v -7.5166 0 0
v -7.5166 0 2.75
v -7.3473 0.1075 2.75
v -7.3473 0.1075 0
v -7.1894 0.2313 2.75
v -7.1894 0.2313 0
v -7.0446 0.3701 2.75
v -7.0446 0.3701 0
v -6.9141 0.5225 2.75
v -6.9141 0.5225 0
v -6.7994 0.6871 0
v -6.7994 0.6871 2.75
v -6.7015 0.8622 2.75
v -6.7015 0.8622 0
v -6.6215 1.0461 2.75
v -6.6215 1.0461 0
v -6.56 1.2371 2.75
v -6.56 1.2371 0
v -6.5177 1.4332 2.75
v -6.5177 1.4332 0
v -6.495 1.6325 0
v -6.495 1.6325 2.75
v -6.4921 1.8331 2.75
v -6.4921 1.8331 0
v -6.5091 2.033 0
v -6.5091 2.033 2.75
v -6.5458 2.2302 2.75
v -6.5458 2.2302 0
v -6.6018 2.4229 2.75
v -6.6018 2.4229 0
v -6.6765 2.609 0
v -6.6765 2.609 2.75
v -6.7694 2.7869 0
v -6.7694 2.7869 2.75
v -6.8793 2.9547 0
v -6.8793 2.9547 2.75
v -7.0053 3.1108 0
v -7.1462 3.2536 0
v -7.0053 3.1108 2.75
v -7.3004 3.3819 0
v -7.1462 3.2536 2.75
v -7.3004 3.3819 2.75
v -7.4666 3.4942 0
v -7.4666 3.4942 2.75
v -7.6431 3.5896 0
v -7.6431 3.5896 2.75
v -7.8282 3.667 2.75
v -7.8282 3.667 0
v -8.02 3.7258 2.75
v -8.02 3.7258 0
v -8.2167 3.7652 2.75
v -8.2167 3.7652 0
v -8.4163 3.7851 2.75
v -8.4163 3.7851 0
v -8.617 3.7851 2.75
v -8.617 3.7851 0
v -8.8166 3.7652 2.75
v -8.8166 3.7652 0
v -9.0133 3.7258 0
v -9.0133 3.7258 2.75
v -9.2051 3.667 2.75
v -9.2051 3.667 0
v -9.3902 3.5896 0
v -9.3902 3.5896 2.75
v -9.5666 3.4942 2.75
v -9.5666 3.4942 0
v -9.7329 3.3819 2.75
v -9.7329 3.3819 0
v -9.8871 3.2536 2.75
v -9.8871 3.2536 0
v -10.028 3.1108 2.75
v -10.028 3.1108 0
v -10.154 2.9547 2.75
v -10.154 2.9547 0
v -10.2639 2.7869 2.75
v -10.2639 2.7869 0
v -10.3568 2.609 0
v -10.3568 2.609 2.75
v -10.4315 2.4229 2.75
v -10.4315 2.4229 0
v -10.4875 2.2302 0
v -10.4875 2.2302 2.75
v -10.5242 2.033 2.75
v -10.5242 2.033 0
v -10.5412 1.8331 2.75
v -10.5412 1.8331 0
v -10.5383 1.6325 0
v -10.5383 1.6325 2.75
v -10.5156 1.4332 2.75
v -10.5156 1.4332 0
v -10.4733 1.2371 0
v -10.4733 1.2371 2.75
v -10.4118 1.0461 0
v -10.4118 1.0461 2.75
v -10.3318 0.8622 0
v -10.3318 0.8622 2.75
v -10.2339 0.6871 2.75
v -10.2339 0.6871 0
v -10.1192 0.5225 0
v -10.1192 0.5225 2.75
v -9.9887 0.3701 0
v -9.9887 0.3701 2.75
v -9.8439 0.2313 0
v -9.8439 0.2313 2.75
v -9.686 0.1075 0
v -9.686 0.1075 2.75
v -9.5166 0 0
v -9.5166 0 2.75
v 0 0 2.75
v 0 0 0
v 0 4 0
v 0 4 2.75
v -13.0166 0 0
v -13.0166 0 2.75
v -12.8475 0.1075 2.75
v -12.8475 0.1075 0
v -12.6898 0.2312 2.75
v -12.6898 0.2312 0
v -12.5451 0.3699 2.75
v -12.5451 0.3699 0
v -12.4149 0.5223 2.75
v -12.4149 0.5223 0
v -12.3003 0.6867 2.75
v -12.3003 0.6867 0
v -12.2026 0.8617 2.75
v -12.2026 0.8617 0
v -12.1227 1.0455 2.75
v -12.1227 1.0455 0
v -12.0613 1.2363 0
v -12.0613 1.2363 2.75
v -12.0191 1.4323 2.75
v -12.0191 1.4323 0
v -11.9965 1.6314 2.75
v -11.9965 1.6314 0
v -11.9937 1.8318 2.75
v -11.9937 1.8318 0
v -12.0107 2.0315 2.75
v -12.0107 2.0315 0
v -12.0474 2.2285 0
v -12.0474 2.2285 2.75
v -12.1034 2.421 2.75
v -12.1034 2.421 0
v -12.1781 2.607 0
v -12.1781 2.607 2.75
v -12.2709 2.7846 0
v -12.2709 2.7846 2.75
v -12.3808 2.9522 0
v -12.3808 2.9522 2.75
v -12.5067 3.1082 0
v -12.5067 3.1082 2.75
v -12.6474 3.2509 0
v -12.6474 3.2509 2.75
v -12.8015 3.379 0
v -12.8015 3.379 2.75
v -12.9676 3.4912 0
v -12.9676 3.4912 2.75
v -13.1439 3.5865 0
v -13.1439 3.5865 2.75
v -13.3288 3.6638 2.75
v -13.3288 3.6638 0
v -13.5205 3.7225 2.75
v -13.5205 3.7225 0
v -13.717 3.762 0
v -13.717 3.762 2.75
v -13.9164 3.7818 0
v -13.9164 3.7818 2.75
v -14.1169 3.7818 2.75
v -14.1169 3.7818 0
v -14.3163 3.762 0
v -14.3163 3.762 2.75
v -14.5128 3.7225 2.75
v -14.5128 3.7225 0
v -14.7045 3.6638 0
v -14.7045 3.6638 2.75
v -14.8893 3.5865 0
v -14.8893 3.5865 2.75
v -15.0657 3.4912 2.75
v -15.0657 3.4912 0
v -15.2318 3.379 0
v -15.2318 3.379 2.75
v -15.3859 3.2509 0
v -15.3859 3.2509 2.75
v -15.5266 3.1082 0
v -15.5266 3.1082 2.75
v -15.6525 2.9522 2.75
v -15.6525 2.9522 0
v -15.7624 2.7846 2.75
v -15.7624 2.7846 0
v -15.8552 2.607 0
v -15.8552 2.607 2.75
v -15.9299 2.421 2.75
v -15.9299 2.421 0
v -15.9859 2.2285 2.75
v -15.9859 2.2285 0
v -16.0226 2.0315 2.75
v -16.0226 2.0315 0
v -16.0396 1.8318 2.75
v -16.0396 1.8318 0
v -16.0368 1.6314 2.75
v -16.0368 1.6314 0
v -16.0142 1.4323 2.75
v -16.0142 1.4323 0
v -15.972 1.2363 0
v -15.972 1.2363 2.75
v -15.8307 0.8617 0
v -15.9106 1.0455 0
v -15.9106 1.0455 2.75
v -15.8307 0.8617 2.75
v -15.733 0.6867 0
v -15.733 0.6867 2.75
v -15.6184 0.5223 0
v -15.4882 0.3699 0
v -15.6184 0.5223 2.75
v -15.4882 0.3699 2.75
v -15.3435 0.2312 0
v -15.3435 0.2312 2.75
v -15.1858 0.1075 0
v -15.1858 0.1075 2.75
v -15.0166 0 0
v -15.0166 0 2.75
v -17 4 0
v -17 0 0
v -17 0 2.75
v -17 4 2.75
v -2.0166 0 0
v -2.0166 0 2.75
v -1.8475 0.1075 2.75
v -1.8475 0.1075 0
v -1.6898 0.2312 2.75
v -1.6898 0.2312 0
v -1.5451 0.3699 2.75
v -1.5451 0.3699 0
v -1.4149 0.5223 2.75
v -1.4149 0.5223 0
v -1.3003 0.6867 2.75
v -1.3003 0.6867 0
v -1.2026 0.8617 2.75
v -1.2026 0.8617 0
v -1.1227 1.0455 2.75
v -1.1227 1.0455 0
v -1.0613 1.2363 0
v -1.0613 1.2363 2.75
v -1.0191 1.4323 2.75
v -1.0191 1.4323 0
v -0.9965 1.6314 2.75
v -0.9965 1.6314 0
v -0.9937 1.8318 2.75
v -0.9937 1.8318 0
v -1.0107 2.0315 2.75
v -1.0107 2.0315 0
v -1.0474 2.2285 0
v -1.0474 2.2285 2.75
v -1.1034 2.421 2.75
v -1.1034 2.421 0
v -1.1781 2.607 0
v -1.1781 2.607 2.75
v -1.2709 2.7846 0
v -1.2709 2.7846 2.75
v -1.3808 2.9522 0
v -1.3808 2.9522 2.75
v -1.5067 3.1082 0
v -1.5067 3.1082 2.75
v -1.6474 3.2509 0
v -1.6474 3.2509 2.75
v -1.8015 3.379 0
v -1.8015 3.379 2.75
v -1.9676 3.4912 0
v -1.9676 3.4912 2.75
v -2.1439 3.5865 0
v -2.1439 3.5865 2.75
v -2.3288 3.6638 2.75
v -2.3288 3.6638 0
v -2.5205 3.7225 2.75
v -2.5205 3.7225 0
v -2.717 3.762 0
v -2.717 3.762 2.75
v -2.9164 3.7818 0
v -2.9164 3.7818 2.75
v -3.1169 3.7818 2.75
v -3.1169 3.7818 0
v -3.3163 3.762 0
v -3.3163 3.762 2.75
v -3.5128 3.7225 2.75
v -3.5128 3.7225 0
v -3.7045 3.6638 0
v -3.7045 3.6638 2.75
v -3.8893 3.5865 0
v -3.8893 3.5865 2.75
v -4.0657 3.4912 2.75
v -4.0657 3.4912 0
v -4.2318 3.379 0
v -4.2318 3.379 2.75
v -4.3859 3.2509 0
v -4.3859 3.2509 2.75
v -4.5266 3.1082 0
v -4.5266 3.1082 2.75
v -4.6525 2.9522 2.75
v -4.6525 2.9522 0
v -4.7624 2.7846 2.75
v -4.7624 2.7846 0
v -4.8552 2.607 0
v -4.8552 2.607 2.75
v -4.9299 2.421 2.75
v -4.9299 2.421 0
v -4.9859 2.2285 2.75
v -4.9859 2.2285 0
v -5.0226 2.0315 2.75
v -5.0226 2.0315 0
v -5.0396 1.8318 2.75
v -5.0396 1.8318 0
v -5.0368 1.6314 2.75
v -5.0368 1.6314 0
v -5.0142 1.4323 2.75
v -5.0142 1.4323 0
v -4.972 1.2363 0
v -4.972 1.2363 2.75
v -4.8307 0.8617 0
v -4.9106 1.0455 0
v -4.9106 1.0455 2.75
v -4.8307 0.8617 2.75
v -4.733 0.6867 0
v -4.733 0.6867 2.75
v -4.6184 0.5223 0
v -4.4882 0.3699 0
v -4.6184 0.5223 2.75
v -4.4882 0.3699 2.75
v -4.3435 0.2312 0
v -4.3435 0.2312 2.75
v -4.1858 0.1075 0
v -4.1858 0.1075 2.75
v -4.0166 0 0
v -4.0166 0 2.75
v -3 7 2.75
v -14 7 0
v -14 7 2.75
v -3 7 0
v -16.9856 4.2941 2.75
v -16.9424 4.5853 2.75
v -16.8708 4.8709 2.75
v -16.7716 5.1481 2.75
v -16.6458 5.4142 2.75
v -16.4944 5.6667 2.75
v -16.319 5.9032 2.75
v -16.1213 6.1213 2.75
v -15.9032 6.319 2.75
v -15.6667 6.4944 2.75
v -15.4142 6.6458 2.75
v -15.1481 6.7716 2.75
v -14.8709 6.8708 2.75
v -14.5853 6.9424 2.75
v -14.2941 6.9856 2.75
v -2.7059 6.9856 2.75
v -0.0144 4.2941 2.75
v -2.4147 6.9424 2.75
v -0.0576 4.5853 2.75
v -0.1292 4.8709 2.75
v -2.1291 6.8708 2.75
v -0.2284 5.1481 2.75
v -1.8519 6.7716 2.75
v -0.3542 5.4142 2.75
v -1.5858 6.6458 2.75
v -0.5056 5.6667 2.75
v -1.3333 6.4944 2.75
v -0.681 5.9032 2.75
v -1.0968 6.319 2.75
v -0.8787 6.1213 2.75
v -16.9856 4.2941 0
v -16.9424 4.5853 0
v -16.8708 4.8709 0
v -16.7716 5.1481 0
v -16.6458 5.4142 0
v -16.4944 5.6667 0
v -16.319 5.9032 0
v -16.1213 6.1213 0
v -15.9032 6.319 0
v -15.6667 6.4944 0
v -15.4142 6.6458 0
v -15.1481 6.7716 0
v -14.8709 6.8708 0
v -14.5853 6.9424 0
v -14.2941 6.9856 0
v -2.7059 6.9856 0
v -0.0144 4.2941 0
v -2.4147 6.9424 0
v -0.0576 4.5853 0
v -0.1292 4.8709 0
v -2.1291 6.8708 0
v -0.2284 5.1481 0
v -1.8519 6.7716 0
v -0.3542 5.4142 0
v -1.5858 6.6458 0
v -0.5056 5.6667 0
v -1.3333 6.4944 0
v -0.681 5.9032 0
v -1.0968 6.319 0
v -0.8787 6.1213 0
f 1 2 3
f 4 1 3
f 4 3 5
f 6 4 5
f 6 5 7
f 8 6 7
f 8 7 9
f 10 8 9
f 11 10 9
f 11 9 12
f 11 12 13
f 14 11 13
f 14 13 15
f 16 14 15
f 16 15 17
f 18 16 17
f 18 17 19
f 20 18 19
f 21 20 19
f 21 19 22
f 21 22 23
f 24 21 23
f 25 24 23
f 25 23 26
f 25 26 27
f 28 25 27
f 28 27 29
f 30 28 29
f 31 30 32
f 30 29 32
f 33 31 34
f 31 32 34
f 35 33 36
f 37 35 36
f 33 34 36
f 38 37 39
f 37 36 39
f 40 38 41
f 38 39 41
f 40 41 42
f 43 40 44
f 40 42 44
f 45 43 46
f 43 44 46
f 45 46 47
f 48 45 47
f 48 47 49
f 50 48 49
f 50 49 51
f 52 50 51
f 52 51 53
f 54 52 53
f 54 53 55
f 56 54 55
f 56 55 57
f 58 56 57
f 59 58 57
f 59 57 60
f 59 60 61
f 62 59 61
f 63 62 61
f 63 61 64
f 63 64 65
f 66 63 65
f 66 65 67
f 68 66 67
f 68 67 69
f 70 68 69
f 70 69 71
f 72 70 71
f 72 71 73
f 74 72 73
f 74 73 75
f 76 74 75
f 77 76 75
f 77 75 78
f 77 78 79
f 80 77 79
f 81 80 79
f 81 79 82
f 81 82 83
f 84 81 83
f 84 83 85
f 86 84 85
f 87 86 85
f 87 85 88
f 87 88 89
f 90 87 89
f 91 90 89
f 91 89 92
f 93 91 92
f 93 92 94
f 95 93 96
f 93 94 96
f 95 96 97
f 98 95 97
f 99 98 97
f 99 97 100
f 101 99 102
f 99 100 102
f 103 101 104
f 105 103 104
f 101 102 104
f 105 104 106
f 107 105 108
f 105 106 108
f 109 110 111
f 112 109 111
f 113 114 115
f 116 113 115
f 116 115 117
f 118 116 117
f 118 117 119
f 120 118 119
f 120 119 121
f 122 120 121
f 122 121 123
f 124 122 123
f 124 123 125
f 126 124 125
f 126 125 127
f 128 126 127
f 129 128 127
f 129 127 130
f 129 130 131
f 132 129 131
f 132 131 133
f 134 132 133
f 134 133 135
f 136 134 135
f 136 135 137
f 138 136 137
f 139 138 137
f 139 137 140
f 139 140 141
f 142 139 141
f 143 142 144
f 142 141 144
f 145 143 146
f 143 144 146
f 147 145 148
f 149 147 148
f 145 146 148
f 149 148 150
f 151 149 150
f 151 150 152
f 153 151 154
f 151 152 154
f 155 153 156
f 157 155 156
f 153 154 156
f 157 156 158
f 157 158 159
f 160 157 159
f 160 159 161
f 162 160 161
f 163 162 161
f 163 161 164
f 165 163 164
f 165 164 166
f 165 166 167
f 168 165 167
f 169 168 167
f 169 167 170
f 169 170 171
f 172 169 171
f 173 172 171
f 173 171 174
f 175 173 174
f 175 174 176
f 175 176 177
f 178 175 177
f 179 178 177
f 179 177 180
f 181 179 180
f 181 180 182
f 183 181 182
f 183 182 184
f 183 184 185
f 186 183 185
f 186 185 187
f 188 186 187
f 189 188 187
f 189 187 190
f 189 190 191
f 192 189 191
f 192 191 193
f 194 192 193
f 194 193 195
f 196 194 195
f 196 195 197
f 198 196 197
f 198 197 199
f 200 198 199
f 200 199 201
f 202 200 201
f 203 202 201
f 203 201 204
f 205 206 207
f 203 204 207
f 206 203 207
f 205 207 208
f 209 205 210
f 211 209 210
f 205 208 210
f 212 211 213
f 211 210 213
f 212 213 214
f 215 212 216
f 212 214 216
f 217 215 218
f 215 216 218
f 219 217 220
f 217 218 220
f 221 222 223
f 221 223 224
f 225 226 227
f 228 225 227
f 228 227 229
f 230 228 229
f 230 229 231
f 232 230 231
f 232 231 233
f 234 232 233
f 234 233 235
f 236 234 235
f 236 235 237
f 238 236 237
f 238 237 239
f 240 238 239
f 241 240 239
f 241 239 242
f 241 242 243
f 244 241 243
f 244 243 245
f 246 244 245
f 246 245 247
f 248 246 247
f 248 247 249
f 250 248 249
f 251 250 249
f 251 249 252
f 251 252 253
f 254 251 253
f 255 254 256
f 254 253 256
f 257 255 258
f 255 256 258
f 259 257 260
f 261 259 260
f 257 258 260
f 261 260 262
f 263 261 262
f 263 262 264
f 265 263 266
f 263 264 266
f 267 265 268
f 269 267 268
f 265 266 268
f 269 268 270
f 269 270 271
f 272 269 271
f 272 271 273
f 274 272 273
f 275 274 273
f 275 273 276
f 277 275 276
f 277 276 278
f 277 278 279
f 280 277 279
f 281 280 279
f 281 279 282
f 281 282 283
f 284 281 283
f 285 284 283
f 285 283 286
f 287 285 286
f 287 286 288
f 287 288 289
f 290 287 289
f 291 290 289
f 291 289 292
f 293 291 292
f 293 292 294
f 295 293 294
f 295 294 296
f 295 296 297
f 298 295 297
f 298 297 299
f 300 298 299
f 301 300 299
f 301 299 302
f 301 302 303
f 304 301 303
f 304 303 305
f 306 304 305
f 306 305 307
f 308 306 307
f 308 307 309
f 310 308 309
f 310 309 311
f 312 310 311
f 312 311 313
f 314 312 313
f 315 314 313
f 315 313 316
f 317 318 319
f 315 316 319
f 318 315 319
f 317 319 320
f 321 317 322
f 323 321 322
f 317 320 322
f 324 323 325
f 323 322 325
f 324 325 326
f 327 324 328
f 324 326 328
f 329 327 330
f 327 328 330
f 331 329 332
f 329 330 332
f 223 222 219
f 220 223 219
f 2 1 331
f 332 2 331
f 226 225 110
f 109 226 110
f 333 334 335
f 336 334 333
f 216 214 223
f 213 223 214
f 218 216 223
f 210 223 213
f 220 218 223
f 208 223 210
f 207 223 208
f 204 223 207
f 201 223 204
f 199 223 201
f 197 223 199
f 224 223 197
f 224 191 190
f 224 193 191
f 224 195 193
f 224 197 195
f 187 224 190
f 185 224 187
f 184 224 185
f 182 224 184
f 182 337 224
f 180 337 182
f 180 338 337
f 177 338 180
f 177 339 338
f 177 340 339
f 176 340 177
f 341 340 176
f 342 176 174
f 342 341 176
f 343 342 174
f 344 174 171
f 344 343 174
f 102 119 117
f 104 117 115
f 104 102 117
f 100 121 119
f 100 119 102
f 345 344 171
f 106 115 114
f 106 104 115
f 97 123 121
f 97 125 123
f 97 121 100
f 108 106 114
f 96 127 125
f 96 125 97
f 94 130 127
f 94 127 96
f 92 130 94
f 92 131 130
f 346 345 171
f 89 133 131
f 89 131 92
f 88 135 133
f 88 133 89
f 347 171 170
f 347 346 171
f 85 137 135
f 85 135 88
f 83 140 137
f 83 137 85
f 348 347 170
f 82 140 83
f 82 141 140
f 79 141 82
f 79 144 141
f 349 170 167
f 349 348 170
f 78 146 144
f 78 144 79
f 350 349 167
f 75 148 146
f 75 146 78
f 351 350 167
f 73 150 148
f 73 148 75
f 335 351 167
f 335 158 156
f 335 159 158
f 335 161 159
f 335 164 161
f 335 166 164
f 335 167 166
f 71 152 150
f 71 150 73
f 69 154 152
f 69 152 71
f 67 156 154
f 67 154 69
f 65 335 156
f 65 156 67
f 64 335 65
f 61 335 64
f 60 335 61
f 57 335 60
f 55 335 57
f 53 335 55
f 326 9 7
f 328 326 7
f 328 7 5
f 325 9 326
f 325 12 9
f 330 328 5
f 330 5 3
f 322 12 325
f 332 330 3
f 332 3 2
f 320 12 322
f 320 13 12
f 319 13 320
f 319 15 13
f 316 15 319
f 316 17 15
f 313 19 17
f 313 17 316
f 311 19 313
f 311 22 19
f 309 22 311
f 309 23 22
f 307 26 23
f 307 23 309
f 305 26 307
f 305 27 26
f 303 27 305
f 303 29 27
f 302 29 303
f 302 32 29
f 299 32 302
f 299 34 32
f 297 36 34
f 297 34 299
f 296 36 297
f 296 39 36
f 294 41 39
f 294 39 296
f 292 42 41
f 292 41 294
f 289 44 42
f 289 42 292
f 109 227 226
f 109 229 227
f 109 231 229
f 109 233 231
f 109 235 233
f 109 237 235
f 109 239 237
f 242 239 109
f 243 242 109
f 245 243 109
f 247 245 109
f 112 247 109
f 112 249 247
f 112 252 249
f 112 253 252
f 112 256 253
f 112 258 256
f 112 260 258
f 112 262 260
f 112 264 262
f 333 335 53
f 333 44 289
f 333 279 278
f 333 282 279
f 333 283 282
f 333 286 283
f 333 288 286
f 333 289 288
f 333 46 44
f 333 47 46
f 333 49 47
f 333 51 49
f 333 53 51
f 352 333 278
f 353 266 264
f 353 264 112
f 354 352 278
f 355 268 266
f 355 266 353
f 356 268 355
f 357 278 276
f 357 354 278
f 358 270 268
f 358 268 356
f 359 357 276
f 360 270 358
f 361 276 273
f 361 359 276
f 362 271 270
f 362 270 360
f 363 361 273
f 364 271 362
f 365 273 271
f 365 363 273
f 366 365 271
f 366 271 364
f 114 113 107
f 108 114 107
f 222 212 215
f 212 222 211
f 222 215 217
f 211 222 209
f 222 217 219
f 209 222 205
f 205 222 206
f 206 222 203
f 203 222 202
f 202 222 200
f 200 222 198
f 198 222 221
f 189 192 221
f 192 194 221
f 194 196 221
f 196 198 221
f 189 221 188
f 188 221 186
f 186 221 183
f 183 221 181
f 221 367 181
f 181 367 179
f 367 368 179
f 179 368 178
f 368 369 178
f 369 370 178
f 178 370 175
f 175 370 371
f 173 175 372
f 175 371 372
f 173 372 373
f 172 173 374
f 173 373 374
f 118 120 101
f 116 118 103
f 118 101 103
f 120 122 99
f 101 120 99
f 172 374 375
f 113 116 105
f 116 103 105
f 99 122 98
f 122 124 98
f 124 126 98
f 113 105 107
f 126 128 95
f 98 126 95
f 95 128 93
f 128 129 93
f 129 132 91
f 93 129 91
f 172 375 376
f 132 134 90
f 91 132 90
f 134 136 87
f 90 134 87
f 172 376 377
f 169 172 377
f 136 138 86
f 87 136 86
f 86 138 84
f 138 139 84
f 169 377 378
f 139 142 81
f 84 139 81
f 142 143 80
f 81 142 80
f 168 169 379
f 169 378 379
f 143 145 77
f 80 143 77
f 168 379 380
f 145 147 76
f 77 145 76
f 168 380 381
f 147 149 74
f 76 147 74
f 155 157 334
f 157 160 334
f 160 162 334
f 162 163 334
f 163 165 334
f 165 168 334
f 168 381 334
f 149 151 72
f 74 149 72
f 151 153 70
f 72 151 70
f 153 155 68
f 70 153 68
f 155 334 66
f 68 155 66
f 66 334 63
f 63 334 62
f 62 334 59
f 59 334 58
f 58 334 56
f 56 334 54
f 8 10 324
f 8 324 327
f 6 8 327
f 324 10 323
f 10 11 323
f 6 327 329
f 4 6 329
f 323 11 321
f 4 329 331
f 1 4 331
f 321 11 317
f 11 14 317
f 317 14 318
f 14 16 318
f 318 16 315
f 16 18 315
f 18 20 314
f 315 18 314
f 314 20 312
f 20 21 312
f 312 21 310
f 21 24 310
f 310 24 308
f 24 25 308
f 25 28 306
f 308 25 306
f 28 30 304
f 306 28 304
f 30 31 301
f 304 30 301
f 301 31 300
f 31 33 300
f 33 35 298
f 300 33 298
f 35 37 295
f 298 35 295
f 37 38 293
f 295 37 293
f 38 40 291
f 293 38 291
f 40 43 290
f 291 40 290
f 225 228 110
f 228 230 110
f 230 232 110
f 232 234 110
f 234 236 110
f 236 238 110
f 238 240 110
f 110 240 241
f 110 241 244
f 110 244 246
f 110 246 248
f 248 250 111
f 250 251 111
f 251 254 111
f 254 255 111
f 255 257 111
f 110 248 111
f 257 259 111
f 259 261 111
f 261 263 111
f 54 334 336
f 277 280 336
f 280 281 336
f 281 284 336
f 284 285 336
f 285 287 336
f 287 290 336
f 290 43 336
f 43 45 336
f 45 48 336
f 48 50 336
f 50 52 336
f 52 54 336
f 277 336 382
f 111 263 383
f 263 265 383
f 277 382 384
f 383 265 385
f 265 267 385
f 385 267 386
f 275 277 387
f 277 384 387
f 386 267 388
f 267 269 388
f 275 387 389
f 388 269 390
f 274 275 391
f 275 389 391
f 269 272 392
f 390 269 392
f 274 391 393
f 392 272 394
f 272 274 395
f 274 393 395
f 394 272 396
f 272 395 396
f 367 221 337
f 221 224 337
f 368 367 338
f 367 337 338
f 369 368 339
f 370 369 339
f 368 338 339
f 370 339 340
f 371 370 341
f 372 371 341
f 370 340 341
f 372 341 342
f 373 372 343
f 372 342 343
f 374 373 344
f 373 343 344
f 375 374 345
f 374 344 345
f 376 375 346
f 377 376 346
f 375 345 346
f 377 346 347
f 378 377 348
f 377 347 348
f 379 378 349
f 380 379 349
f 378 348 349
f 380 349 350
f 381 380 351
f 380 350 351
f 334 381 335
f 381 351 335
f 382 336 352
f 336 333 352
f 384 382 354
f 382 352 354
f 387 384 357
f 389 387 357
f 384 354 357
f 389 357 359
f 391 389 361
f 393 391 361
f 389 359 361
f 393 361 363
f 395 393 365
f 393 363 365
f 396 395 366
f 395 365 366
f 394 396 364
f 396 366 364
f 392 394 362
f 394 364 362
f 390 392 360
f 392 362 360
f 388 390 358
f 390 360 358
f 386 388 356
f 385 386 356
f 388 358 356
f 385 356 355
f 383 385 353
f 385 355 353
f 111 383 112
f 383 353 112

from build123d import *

# Parameters (mm, degrees)
F0_W     = 17
F0_H     = 7
F1_DEPTH = 2.75
F3_DEPTH = 25
F4_R     = 3


with BuildPart() as f1:
    # F0 (on Top) → F1 (new body)
    with BuildSketch(Plane.XY):
        with Locations((-8.5, 3.5)):
            Rectangle(F0_W, F0_H)
    extrude(amount=F1_DEPTH)

    # F2 (on face) → F3 (cut)
    with BuildSketch(Plane.XY.offset(2.75)):
        with BuildLine():
            ThreePointArc((-7.516647, 0), (-8.516647, 3.787575), (-9.516647, 0))
            Line((-9.516647, 0), (-7.516647, 0))
        make_face()
        with BuildLine():
            ThreePointArc((-2.016647, 0), (-3.016647, 3.784253), (-4.016647, 0))
            Line((-4.016647, 0), (-2.016647, 0))
        make_face()
        with BuildLine():
            Line((-15.016647, 0), (-13.016647, 0))
            ThreePointArc((-13.016647, 0), (-14.016647, 3.784253), (-15.016647, 0))
        make_face()
    extrude(amount=-F3_DEPTH, mode=Mode.SUBTRACT)

    # F4
    f4_edges = [f1.edges().sort_by_distance(p)[0] for p in [
        (-17, 7, 1.375),
        (0, 7, 1.375),
    ]]
    fillet(f4_edges, radius=F4_R)


solid = f1.part
